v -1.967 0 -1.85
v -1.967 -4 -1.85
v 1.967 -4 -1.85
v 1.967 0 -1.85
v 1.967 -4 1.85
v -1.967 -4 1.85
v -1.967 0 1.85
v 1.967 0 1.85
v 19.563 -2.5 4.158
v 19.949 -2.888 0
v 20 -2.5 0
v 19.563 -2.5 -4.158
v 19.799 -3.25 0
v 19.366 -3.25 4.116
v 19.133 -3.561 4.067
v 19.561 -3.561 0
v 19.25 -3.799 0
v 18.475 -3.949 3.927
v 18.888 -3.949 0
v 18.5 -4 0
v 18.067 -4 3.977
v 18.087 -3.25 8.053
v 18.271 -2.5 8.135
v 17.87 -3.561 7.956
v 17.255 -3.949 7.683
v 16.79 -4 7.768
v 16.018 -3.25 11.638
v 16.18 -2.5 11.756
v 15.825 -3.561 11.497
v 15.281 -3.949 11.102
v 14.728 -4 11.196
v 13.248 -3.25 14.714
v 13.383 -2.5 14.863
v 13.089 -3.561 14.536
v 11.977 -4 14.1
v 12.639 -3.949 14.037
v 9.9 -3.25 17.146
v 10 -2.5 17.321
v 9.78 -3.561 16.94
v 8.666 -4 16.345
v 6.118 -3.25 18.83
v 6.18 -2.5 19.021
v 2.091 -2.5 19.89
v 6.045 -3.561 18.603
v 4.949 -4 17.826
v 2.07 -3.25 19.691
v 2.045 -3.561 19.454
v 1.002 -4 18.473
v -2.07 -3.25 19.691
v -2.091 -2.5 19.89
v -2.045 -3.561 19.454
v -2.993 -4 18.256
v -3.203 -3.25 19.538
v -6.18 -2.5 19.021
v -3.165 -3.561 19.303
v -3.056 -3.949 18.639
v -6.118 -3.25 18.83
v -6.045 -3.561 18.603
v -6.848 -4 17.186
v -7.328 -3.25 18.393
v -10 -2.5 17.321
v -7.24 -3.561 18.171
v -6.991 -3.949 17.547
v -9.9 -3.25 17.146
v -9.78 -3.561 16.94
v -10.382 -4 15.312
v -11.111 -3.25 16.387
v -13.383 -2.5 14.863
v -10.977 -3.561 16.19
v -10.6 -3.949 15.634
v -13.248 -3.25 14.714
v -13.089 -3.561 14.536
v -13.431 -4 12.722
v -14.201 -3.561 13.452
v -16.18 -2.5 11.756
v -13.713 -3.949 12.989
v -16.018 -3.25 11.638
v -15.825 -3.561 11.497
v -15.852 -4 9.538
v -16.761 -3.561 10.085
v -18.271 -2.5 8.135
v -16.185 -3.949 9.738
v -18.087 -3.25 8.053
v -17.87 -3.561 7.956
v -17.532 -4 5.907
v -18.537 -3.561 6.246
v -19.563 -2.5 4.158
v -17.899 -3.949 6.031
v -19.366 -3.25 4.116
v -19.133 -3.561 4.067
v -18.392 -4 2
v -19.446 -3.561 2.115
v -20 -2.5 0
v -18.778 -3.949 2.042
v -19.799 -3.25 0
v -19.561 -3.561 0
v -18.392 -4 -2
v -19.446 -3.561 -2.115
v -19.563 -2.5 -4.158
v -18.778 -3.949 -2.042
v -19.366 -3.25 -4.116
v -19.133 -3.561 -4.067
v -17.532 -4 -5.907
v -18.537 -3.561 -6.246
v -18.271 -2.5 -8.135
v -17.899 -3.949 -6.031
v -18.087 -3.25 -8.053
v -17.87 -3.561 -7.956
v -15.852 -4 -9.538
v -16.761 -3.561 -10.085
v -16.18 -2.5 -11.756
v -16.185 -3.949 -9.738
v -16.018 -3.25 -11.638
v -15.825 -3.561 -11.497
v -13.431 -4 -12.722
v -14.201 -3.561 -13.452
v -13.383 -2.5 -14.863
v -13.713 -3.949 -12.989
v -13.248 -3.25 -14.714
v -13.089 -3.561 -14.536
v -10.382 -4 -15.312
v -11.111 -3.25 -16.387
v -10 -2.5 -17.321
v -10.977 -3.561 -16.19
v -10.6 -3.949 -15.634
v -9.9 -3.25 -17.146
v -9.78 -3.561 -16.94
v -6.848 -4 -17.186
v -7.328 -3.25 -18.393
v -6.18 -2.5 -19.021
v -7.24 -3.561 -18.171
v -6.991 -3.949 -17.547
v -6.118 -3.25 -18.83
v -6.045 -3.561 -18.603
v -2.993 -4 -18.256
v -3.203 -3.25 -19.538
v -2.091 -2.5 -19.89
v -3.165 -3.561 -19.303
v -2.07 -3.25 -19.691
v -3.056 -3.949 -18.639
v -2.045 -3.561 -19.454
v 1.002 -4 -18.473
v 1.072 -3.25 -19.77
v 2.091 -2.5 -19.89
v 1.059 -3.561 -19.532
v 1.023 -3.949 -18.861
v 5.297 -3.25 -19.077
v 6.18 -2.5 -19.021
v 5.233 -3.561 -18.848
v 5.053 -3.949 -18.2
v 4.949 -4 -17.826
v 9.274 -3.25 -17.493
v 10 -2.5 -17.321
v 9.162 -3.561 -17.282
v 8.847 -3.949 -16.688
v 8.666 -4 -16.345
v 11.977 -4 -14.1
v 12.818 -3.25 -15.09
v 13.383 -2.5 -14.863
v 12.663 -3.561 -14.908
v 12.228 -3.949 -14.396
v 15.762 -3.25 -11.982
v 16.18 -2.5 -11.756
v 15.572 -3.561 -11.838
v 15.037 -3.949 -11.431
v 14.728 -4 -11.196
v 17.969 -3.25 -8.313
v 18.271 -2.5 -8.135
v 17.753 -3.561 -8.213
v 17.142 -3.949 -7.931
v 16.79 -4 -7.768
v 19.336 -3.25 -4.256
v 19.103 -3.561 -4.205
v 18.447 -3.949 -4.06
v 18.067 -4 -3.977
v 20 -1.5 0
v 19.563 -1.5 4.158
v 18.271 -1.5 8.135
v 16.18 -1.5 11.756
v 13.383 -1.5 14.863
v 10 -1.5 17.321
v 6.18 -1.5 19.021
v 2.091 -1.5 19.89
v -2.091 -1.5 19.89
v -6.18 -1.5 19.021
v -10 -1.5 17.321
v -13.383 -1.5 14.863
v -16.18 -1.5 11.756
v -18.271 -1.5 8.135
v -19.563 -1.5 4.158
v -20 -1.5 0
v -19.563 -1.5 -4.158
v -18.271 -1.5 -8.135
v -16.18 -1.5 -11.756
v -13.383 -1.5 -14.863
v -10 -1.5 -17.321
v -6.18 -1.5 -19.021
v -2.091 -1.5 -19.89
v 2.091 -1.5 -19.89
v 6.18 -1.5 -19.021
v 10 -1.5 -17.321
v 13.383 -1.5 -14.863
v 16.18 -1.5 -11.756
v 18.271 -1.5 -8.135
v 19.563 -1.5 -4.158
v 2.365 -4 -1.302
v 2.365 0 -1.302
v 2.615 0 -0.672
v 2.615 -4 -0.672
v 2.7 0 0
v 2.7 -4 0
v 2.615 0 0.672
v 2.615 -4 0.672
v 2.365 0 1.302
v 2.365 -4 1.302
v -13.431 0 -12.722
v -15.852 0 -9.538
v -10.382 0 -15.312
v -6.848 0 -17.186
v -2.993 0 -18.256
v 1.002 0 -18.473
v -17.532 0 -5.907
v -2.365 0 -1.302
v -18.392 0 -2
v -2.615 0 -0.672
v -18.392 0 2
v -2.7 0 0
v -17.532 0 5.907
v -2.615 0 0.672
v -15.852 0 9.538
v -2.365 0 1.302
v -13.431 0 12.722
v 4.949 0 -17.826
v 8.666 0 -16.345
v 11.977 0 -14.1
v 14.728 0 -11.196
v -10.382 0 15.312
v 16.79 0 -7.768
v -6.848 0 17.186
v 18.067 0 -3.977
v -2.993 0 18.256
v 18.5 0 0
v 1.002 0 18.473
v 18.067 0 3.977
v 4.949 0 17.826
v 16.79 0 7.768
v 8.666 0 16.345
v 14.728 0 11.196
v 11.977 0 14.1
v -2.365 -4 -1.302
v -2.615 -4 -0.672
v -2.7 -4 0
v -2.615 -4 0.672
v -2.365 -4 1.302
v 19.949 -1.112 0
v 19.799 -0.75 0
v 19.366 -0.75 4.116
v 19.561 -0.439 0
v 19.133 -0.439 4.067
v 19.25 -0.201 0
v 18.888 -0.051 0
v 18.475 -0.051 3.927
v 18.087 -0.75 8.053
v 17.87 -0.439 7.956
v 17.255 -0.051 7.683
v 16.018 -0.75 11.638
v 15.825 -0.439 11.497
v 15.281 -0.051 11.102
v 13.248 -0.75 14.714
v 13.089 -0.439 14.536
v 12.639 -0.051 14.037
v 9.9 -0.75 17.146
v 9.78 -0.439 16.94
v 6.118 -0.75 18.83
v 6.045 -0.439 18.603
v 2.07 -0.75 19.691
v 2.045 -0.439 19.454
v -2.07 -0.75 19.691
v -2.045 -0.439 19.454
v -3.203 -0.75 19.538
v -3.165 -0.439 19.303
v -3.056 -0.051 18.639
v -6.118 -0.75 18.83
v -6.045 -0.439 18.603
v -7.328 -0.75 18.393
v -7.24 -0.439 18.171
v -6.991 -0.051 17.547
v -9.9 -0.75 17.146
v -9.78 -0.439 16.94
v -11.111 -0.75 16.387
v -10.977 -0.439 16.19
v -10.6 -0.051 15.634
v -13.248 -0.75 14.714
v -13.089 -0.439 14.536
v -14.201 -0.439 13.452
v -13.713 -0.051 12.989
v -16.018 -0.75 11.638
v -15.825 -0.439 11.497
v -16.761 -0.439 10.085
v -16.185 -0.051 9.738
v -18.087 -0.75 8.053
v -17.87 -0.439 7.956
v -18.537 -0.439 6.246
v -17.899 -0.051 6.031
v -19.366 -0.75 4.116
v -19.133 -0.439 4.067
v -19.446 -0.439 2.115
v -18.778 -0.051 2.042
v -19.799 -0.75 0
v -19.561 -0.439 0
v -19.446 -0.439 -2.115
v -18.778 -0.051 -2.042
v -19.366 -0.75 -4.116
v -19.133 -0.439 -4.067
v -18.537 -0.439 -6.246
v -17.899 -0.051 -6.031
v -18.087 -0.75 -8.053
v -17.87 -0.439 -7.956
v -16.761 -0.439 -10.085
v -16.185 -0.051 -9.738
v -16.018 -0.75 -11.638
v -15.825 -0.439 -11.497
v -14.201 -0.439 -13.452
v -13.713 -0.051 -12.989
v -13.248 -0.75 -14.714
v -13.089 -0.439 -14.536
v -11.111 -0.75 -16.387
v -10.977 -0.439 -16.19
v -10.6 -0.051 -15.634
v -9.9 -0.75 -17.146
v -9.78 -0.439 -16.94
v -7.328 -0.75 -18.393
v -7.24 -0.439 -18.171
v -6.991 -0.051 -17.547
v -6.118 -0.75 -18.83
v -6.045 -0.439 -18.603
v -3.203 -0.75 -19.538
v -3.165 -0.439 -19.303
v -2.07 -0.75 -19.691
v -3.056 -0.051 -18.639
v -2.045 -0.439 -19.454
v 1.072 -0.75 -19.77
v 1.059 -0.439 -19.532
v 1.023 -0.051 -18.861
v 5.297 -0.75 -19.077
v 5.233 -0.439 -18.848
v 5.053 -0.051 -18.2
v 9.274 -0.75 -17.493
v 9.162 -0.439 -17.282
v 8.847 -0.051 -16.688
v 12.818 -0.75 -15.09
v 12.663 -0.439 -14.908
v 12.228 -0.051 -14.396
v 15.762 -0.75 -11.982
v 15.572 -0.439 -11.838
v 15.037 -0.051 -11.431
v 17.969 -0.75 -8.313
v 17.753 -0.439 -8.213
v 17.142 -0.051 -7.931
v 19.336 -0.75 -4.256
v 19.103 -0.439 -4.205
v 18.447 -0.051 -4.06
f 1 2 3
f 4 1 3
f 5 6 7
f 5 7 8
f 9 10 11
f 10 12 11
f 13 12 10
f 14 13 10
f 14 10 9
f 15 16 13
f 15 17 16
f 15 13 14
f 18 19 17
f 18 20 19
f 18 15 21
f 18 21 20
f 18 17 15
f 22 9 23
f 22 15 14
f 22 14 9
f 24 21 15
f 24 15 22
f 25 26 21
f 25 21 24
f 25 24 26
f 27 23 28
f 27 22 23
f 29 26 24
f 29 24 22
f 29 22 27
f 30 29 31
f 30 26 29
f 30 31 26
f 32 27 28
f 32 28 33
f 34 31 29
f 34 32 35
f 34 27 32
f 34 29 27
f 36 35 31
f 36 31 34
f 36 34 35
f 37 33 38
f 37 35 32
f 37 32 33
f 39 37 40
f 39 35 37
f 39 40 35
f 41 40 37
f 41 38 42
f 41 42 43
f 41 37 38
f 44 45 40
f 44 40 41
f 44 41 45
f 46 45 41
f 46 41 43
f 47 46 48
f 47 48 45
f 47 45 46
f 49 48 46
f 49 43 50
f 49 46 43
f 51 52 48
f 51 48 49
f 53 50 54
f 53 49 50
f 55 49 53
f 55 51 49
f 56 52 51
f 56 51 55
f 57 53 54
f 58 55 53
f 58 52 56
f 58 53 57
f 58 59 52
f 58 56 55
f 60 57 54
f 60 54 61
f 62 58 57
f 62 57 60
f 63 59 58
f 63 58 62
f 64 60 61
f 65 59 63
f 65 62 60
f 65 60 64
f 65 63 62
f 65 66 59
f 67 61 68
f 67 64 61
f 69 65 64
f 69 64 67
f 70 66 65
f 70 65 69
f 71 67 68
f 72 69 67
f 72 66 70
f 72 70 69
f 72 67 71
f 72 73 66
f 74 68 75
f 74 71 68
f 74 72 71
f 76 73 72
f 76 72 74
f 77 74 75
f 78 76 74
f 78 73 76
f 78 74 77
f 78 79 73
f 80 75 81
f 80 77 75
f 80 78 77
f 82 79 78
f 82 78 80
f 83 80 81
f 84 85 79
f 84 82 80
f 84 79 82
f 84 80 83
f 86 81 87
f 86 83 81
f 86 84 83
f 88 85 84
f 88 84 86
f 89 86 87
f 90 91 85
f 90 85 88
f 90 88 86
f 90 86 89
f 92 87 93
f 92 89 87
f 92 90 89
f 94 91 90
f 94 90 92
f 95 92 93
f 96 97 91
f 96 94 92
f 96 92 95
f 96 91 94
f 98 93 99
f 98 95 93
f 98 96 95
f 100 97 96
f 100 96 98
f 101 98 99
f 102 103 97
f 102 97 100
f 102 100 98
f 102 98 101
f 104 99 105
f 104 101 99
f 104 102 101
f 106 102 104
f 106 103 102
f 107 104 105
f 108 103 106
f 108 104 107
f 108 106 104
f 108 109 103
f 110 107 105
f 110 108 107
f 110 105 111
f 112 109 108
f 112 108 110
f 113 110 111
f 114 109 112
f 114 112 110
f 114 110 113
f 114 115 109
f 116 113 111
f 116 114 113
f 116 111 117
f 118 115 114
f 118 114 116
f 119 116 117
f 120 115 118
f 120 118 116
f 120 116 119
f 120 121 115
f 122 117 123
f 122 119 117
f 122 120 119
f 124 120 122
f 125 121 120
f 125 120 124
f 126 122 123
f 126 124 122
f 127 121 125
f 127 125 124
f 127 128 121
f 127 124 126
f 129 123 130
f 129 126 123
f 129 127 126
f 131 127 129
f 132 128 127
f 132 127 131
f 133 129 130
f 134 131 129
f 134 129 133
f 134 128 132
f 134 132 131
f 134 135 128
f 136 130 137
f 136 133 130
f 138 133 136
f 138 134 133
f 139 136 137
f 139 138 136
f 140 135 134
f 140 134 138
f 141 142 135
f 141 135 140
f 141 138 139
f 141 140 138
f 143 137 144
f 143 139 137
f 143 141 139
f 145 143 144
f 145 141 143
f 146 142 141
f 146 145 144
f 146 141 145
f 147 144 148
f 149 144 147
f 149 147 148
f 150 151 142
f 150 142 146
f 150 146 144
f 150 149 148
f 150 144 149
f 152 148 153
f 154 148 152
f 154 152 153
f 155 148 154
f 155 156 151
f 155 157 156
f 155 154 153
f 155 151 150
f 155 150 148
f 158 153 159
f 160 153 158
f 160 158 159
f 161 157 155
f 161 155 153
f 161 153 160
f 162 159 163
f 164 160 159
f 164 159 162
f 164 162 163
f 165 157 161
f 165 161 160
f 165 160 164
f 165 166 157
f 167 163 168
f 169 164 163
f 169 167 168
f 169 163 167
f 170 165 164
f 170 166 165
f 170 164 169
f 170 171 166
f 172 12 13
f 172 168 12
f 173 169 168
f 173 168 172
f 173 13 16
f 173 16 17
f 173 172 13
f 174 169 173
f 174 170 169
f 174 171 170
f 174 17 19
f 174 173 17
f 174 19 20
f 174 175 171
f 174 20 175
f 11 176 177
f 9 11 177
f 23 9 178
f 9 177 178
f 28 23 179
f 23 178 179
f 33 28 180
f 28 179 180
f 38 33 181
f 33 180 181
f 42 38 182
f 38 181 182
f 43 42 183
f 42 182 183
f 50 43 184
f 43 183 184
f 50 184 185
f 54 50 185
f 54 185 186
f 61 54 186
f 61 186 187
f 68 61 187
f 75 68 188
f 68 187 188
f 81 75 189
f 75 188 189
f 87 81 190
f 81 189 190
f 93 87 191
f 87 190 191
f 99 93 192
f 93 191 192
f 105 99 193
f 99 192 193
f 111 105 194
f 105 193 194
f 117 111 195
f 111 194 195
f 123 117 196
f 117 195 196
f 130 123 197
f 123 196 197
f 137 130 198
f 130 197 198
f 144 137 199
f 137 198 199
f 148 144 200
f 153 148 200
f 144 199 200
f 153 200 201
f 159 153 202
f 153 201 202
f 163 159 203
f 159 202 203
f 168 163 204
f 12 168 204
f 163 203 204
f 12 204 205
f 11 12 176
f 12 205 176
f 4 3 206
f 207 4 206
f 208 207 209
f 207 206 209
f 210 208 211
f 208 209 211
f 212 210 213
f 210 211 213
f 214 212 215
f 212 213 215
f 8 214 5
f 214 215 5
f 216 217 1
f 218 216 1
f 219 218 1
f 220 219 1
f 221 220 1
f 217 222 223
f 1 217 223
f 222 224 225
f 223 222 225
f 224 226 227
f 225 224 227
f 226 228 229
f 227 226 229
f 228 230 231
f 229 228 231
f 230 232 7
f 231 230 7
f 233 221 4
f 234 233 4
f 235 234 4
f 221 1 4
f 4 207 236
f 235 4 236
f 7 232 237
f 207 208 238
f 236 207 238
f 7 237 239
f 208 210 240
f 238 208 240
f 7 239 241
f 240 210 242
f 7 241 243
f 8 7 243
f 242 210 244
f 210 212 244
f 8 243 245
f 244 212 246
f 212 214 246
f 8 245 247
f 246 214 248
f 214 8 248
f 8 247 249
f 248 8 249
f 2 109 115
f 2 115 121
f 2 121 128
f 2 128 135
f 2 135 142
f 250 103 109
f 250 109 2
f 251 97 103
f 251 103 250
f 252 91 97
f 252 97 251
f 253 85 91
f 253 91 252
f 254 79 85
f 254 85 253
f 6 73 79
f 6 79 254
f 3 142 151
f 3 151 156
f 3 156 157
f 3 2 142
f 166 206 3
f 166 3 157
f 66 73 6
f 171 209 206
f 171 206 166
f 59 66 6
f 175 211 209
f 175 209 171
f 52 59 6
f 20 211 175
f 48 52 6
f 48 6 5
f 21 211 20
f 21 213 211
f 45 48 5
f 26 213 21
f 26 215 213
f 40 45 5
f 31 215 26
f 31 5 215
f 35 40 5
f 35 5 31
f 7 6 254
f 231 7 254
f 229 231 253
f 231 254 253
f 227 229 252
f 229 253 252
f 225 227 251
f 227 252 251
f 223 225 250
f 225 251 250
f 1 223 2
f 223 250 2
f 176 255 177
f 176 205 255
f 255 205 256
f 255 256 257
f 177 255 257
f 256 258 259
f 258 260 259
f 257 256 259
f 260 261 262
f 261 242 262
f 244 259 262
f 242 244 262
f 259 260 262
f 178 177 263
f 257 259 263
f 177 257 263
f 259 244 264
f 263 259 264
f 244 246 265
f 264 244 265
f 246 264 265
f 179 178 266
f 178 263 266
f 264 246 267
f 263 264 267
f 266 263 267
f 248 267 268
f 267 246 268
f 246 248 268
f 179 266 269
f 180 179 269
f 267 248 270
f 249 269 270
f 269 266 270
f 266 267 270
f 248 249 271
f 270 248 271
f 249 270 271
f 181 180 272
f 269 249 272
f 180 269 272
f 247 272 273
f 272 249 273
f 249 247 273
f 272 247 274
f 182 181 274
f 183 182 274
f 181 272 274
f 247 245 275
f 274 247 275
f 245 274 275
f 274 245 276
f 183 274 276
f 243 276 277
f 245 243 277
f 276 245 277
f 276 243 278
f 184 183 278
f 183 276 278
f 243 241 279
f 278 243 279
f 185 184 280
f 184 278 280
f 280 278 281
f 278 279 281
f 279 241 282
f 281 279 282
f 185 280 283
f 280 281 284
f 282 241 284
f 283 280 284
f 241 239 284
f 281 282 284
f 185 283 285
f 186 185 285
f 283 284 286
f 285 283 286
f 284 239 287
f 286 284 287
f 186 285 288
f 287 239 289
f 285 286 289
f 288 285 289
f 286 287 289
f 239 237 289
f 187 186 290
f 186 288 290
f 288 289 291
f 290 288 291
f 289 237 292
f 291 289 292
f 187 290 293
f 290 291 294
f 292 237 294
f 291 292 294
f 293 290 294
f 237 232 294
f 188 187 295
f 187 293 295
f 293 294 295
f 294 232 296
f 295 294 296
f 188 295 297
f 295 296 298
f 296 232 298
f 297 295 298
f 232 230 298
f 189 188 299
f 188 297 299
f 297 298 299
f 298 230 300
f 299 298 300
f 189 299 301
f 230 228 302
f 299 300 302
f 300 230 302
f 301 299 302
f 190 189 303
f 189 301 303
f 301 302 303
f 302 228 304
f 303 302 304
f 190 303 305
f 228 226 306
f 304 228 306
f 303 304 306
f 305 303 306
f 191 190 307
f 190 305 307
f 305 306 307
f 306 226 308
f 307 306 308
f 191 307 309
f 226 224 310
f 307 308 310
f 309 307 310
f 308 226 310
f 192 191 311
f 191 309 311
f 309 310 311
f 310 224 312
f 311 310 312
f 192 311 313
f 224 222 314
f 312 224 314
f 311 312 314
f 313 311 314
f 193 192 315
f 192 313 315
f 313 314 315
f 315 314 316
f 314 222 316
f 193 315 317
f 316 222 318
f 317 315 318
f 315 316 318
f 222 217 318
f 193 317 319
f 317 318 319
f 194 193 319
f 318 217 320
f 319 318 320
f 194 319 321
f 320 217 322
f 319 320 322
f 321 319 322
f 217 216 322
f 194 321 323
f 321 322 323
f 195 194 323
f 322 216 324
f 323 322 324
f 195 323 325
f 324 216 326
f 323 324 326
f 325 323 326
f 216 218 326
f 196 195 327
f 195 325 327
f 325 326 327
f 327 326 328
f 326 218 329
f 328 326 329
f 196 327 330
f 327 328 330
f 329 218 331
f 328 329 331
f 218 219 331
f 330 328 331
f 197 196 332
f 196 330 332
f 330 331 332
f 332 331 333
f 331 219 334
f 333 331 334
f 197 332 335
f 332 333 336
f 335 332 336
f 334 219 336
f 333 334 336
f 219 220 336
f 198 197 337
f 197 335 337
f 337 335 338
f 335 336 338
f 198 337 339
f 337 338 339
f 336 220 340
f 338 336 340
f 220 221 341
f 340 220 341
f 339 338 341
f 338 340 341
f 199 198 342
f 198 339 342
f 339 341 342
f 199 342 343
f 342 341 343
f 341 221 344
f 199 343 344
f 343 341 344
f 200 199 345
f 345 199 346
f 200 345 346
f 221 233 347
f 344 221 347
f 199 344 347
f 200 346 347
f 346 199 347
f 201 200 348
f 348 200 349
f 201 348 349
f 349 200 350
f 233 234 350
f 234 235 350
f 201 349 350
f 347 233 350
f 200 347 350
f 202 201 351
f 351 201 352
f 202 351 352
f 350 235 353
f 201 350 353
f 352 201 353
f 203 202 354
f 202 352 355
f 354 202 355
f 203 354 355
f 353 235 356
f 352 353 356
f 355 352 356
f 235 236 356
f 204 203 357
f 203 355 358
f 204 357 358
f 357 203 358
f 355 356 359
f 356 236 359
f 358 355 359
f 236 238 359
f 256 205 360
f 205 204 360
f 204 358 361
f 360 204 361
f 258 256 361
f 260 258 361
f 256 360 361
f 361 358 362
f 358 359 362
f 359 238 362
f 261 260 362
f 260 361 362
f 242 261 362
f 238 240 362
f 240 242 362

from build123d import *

# Parameters (mm, degrees)
SKETCH_R     = 20
PAD_DEPTH    = 4
FILLET_R     = 1.5
POCKET_DEPTH = 4.001


with BuildPart() as part:
    # Sketch → Pad (new body)
    with BuildSketch(Plane.XZ):
        Circle(SKETCH_R)
    extrude(amount=PAD_DEPTH)

    # Fillet
    fillet_edges = [part.edges().sort_by_distance(p)[0] for p in [
        (-20, -4, 0),
        (-20, 0, 0),
    ]]
    fillet(fillet_edges, radius=FILLET_R)

    # Sketch001 (on Face5 of Fillet) → Pocket (cut, through all)
    with BuildSketch(Plane.XZ.offset(4)):
        with BuildLine():
            ThreePointArc((-1.966596, 1.85), (-2.7, 0), (-1.966596, -1.85))
            Line((-1.966596, -1.85), (1.966596, -1.85))
            ThreePointArc((1.966596, -1.85), (2.7, 0), (1.966596, 1.85))
            Line((-1.966596, 1.85), (1.966596, 1.85))
        make_face()
    extrude(amount=-POCKET_DEPTH, mode=Mode.SUBTRACT)


solid = part.part
